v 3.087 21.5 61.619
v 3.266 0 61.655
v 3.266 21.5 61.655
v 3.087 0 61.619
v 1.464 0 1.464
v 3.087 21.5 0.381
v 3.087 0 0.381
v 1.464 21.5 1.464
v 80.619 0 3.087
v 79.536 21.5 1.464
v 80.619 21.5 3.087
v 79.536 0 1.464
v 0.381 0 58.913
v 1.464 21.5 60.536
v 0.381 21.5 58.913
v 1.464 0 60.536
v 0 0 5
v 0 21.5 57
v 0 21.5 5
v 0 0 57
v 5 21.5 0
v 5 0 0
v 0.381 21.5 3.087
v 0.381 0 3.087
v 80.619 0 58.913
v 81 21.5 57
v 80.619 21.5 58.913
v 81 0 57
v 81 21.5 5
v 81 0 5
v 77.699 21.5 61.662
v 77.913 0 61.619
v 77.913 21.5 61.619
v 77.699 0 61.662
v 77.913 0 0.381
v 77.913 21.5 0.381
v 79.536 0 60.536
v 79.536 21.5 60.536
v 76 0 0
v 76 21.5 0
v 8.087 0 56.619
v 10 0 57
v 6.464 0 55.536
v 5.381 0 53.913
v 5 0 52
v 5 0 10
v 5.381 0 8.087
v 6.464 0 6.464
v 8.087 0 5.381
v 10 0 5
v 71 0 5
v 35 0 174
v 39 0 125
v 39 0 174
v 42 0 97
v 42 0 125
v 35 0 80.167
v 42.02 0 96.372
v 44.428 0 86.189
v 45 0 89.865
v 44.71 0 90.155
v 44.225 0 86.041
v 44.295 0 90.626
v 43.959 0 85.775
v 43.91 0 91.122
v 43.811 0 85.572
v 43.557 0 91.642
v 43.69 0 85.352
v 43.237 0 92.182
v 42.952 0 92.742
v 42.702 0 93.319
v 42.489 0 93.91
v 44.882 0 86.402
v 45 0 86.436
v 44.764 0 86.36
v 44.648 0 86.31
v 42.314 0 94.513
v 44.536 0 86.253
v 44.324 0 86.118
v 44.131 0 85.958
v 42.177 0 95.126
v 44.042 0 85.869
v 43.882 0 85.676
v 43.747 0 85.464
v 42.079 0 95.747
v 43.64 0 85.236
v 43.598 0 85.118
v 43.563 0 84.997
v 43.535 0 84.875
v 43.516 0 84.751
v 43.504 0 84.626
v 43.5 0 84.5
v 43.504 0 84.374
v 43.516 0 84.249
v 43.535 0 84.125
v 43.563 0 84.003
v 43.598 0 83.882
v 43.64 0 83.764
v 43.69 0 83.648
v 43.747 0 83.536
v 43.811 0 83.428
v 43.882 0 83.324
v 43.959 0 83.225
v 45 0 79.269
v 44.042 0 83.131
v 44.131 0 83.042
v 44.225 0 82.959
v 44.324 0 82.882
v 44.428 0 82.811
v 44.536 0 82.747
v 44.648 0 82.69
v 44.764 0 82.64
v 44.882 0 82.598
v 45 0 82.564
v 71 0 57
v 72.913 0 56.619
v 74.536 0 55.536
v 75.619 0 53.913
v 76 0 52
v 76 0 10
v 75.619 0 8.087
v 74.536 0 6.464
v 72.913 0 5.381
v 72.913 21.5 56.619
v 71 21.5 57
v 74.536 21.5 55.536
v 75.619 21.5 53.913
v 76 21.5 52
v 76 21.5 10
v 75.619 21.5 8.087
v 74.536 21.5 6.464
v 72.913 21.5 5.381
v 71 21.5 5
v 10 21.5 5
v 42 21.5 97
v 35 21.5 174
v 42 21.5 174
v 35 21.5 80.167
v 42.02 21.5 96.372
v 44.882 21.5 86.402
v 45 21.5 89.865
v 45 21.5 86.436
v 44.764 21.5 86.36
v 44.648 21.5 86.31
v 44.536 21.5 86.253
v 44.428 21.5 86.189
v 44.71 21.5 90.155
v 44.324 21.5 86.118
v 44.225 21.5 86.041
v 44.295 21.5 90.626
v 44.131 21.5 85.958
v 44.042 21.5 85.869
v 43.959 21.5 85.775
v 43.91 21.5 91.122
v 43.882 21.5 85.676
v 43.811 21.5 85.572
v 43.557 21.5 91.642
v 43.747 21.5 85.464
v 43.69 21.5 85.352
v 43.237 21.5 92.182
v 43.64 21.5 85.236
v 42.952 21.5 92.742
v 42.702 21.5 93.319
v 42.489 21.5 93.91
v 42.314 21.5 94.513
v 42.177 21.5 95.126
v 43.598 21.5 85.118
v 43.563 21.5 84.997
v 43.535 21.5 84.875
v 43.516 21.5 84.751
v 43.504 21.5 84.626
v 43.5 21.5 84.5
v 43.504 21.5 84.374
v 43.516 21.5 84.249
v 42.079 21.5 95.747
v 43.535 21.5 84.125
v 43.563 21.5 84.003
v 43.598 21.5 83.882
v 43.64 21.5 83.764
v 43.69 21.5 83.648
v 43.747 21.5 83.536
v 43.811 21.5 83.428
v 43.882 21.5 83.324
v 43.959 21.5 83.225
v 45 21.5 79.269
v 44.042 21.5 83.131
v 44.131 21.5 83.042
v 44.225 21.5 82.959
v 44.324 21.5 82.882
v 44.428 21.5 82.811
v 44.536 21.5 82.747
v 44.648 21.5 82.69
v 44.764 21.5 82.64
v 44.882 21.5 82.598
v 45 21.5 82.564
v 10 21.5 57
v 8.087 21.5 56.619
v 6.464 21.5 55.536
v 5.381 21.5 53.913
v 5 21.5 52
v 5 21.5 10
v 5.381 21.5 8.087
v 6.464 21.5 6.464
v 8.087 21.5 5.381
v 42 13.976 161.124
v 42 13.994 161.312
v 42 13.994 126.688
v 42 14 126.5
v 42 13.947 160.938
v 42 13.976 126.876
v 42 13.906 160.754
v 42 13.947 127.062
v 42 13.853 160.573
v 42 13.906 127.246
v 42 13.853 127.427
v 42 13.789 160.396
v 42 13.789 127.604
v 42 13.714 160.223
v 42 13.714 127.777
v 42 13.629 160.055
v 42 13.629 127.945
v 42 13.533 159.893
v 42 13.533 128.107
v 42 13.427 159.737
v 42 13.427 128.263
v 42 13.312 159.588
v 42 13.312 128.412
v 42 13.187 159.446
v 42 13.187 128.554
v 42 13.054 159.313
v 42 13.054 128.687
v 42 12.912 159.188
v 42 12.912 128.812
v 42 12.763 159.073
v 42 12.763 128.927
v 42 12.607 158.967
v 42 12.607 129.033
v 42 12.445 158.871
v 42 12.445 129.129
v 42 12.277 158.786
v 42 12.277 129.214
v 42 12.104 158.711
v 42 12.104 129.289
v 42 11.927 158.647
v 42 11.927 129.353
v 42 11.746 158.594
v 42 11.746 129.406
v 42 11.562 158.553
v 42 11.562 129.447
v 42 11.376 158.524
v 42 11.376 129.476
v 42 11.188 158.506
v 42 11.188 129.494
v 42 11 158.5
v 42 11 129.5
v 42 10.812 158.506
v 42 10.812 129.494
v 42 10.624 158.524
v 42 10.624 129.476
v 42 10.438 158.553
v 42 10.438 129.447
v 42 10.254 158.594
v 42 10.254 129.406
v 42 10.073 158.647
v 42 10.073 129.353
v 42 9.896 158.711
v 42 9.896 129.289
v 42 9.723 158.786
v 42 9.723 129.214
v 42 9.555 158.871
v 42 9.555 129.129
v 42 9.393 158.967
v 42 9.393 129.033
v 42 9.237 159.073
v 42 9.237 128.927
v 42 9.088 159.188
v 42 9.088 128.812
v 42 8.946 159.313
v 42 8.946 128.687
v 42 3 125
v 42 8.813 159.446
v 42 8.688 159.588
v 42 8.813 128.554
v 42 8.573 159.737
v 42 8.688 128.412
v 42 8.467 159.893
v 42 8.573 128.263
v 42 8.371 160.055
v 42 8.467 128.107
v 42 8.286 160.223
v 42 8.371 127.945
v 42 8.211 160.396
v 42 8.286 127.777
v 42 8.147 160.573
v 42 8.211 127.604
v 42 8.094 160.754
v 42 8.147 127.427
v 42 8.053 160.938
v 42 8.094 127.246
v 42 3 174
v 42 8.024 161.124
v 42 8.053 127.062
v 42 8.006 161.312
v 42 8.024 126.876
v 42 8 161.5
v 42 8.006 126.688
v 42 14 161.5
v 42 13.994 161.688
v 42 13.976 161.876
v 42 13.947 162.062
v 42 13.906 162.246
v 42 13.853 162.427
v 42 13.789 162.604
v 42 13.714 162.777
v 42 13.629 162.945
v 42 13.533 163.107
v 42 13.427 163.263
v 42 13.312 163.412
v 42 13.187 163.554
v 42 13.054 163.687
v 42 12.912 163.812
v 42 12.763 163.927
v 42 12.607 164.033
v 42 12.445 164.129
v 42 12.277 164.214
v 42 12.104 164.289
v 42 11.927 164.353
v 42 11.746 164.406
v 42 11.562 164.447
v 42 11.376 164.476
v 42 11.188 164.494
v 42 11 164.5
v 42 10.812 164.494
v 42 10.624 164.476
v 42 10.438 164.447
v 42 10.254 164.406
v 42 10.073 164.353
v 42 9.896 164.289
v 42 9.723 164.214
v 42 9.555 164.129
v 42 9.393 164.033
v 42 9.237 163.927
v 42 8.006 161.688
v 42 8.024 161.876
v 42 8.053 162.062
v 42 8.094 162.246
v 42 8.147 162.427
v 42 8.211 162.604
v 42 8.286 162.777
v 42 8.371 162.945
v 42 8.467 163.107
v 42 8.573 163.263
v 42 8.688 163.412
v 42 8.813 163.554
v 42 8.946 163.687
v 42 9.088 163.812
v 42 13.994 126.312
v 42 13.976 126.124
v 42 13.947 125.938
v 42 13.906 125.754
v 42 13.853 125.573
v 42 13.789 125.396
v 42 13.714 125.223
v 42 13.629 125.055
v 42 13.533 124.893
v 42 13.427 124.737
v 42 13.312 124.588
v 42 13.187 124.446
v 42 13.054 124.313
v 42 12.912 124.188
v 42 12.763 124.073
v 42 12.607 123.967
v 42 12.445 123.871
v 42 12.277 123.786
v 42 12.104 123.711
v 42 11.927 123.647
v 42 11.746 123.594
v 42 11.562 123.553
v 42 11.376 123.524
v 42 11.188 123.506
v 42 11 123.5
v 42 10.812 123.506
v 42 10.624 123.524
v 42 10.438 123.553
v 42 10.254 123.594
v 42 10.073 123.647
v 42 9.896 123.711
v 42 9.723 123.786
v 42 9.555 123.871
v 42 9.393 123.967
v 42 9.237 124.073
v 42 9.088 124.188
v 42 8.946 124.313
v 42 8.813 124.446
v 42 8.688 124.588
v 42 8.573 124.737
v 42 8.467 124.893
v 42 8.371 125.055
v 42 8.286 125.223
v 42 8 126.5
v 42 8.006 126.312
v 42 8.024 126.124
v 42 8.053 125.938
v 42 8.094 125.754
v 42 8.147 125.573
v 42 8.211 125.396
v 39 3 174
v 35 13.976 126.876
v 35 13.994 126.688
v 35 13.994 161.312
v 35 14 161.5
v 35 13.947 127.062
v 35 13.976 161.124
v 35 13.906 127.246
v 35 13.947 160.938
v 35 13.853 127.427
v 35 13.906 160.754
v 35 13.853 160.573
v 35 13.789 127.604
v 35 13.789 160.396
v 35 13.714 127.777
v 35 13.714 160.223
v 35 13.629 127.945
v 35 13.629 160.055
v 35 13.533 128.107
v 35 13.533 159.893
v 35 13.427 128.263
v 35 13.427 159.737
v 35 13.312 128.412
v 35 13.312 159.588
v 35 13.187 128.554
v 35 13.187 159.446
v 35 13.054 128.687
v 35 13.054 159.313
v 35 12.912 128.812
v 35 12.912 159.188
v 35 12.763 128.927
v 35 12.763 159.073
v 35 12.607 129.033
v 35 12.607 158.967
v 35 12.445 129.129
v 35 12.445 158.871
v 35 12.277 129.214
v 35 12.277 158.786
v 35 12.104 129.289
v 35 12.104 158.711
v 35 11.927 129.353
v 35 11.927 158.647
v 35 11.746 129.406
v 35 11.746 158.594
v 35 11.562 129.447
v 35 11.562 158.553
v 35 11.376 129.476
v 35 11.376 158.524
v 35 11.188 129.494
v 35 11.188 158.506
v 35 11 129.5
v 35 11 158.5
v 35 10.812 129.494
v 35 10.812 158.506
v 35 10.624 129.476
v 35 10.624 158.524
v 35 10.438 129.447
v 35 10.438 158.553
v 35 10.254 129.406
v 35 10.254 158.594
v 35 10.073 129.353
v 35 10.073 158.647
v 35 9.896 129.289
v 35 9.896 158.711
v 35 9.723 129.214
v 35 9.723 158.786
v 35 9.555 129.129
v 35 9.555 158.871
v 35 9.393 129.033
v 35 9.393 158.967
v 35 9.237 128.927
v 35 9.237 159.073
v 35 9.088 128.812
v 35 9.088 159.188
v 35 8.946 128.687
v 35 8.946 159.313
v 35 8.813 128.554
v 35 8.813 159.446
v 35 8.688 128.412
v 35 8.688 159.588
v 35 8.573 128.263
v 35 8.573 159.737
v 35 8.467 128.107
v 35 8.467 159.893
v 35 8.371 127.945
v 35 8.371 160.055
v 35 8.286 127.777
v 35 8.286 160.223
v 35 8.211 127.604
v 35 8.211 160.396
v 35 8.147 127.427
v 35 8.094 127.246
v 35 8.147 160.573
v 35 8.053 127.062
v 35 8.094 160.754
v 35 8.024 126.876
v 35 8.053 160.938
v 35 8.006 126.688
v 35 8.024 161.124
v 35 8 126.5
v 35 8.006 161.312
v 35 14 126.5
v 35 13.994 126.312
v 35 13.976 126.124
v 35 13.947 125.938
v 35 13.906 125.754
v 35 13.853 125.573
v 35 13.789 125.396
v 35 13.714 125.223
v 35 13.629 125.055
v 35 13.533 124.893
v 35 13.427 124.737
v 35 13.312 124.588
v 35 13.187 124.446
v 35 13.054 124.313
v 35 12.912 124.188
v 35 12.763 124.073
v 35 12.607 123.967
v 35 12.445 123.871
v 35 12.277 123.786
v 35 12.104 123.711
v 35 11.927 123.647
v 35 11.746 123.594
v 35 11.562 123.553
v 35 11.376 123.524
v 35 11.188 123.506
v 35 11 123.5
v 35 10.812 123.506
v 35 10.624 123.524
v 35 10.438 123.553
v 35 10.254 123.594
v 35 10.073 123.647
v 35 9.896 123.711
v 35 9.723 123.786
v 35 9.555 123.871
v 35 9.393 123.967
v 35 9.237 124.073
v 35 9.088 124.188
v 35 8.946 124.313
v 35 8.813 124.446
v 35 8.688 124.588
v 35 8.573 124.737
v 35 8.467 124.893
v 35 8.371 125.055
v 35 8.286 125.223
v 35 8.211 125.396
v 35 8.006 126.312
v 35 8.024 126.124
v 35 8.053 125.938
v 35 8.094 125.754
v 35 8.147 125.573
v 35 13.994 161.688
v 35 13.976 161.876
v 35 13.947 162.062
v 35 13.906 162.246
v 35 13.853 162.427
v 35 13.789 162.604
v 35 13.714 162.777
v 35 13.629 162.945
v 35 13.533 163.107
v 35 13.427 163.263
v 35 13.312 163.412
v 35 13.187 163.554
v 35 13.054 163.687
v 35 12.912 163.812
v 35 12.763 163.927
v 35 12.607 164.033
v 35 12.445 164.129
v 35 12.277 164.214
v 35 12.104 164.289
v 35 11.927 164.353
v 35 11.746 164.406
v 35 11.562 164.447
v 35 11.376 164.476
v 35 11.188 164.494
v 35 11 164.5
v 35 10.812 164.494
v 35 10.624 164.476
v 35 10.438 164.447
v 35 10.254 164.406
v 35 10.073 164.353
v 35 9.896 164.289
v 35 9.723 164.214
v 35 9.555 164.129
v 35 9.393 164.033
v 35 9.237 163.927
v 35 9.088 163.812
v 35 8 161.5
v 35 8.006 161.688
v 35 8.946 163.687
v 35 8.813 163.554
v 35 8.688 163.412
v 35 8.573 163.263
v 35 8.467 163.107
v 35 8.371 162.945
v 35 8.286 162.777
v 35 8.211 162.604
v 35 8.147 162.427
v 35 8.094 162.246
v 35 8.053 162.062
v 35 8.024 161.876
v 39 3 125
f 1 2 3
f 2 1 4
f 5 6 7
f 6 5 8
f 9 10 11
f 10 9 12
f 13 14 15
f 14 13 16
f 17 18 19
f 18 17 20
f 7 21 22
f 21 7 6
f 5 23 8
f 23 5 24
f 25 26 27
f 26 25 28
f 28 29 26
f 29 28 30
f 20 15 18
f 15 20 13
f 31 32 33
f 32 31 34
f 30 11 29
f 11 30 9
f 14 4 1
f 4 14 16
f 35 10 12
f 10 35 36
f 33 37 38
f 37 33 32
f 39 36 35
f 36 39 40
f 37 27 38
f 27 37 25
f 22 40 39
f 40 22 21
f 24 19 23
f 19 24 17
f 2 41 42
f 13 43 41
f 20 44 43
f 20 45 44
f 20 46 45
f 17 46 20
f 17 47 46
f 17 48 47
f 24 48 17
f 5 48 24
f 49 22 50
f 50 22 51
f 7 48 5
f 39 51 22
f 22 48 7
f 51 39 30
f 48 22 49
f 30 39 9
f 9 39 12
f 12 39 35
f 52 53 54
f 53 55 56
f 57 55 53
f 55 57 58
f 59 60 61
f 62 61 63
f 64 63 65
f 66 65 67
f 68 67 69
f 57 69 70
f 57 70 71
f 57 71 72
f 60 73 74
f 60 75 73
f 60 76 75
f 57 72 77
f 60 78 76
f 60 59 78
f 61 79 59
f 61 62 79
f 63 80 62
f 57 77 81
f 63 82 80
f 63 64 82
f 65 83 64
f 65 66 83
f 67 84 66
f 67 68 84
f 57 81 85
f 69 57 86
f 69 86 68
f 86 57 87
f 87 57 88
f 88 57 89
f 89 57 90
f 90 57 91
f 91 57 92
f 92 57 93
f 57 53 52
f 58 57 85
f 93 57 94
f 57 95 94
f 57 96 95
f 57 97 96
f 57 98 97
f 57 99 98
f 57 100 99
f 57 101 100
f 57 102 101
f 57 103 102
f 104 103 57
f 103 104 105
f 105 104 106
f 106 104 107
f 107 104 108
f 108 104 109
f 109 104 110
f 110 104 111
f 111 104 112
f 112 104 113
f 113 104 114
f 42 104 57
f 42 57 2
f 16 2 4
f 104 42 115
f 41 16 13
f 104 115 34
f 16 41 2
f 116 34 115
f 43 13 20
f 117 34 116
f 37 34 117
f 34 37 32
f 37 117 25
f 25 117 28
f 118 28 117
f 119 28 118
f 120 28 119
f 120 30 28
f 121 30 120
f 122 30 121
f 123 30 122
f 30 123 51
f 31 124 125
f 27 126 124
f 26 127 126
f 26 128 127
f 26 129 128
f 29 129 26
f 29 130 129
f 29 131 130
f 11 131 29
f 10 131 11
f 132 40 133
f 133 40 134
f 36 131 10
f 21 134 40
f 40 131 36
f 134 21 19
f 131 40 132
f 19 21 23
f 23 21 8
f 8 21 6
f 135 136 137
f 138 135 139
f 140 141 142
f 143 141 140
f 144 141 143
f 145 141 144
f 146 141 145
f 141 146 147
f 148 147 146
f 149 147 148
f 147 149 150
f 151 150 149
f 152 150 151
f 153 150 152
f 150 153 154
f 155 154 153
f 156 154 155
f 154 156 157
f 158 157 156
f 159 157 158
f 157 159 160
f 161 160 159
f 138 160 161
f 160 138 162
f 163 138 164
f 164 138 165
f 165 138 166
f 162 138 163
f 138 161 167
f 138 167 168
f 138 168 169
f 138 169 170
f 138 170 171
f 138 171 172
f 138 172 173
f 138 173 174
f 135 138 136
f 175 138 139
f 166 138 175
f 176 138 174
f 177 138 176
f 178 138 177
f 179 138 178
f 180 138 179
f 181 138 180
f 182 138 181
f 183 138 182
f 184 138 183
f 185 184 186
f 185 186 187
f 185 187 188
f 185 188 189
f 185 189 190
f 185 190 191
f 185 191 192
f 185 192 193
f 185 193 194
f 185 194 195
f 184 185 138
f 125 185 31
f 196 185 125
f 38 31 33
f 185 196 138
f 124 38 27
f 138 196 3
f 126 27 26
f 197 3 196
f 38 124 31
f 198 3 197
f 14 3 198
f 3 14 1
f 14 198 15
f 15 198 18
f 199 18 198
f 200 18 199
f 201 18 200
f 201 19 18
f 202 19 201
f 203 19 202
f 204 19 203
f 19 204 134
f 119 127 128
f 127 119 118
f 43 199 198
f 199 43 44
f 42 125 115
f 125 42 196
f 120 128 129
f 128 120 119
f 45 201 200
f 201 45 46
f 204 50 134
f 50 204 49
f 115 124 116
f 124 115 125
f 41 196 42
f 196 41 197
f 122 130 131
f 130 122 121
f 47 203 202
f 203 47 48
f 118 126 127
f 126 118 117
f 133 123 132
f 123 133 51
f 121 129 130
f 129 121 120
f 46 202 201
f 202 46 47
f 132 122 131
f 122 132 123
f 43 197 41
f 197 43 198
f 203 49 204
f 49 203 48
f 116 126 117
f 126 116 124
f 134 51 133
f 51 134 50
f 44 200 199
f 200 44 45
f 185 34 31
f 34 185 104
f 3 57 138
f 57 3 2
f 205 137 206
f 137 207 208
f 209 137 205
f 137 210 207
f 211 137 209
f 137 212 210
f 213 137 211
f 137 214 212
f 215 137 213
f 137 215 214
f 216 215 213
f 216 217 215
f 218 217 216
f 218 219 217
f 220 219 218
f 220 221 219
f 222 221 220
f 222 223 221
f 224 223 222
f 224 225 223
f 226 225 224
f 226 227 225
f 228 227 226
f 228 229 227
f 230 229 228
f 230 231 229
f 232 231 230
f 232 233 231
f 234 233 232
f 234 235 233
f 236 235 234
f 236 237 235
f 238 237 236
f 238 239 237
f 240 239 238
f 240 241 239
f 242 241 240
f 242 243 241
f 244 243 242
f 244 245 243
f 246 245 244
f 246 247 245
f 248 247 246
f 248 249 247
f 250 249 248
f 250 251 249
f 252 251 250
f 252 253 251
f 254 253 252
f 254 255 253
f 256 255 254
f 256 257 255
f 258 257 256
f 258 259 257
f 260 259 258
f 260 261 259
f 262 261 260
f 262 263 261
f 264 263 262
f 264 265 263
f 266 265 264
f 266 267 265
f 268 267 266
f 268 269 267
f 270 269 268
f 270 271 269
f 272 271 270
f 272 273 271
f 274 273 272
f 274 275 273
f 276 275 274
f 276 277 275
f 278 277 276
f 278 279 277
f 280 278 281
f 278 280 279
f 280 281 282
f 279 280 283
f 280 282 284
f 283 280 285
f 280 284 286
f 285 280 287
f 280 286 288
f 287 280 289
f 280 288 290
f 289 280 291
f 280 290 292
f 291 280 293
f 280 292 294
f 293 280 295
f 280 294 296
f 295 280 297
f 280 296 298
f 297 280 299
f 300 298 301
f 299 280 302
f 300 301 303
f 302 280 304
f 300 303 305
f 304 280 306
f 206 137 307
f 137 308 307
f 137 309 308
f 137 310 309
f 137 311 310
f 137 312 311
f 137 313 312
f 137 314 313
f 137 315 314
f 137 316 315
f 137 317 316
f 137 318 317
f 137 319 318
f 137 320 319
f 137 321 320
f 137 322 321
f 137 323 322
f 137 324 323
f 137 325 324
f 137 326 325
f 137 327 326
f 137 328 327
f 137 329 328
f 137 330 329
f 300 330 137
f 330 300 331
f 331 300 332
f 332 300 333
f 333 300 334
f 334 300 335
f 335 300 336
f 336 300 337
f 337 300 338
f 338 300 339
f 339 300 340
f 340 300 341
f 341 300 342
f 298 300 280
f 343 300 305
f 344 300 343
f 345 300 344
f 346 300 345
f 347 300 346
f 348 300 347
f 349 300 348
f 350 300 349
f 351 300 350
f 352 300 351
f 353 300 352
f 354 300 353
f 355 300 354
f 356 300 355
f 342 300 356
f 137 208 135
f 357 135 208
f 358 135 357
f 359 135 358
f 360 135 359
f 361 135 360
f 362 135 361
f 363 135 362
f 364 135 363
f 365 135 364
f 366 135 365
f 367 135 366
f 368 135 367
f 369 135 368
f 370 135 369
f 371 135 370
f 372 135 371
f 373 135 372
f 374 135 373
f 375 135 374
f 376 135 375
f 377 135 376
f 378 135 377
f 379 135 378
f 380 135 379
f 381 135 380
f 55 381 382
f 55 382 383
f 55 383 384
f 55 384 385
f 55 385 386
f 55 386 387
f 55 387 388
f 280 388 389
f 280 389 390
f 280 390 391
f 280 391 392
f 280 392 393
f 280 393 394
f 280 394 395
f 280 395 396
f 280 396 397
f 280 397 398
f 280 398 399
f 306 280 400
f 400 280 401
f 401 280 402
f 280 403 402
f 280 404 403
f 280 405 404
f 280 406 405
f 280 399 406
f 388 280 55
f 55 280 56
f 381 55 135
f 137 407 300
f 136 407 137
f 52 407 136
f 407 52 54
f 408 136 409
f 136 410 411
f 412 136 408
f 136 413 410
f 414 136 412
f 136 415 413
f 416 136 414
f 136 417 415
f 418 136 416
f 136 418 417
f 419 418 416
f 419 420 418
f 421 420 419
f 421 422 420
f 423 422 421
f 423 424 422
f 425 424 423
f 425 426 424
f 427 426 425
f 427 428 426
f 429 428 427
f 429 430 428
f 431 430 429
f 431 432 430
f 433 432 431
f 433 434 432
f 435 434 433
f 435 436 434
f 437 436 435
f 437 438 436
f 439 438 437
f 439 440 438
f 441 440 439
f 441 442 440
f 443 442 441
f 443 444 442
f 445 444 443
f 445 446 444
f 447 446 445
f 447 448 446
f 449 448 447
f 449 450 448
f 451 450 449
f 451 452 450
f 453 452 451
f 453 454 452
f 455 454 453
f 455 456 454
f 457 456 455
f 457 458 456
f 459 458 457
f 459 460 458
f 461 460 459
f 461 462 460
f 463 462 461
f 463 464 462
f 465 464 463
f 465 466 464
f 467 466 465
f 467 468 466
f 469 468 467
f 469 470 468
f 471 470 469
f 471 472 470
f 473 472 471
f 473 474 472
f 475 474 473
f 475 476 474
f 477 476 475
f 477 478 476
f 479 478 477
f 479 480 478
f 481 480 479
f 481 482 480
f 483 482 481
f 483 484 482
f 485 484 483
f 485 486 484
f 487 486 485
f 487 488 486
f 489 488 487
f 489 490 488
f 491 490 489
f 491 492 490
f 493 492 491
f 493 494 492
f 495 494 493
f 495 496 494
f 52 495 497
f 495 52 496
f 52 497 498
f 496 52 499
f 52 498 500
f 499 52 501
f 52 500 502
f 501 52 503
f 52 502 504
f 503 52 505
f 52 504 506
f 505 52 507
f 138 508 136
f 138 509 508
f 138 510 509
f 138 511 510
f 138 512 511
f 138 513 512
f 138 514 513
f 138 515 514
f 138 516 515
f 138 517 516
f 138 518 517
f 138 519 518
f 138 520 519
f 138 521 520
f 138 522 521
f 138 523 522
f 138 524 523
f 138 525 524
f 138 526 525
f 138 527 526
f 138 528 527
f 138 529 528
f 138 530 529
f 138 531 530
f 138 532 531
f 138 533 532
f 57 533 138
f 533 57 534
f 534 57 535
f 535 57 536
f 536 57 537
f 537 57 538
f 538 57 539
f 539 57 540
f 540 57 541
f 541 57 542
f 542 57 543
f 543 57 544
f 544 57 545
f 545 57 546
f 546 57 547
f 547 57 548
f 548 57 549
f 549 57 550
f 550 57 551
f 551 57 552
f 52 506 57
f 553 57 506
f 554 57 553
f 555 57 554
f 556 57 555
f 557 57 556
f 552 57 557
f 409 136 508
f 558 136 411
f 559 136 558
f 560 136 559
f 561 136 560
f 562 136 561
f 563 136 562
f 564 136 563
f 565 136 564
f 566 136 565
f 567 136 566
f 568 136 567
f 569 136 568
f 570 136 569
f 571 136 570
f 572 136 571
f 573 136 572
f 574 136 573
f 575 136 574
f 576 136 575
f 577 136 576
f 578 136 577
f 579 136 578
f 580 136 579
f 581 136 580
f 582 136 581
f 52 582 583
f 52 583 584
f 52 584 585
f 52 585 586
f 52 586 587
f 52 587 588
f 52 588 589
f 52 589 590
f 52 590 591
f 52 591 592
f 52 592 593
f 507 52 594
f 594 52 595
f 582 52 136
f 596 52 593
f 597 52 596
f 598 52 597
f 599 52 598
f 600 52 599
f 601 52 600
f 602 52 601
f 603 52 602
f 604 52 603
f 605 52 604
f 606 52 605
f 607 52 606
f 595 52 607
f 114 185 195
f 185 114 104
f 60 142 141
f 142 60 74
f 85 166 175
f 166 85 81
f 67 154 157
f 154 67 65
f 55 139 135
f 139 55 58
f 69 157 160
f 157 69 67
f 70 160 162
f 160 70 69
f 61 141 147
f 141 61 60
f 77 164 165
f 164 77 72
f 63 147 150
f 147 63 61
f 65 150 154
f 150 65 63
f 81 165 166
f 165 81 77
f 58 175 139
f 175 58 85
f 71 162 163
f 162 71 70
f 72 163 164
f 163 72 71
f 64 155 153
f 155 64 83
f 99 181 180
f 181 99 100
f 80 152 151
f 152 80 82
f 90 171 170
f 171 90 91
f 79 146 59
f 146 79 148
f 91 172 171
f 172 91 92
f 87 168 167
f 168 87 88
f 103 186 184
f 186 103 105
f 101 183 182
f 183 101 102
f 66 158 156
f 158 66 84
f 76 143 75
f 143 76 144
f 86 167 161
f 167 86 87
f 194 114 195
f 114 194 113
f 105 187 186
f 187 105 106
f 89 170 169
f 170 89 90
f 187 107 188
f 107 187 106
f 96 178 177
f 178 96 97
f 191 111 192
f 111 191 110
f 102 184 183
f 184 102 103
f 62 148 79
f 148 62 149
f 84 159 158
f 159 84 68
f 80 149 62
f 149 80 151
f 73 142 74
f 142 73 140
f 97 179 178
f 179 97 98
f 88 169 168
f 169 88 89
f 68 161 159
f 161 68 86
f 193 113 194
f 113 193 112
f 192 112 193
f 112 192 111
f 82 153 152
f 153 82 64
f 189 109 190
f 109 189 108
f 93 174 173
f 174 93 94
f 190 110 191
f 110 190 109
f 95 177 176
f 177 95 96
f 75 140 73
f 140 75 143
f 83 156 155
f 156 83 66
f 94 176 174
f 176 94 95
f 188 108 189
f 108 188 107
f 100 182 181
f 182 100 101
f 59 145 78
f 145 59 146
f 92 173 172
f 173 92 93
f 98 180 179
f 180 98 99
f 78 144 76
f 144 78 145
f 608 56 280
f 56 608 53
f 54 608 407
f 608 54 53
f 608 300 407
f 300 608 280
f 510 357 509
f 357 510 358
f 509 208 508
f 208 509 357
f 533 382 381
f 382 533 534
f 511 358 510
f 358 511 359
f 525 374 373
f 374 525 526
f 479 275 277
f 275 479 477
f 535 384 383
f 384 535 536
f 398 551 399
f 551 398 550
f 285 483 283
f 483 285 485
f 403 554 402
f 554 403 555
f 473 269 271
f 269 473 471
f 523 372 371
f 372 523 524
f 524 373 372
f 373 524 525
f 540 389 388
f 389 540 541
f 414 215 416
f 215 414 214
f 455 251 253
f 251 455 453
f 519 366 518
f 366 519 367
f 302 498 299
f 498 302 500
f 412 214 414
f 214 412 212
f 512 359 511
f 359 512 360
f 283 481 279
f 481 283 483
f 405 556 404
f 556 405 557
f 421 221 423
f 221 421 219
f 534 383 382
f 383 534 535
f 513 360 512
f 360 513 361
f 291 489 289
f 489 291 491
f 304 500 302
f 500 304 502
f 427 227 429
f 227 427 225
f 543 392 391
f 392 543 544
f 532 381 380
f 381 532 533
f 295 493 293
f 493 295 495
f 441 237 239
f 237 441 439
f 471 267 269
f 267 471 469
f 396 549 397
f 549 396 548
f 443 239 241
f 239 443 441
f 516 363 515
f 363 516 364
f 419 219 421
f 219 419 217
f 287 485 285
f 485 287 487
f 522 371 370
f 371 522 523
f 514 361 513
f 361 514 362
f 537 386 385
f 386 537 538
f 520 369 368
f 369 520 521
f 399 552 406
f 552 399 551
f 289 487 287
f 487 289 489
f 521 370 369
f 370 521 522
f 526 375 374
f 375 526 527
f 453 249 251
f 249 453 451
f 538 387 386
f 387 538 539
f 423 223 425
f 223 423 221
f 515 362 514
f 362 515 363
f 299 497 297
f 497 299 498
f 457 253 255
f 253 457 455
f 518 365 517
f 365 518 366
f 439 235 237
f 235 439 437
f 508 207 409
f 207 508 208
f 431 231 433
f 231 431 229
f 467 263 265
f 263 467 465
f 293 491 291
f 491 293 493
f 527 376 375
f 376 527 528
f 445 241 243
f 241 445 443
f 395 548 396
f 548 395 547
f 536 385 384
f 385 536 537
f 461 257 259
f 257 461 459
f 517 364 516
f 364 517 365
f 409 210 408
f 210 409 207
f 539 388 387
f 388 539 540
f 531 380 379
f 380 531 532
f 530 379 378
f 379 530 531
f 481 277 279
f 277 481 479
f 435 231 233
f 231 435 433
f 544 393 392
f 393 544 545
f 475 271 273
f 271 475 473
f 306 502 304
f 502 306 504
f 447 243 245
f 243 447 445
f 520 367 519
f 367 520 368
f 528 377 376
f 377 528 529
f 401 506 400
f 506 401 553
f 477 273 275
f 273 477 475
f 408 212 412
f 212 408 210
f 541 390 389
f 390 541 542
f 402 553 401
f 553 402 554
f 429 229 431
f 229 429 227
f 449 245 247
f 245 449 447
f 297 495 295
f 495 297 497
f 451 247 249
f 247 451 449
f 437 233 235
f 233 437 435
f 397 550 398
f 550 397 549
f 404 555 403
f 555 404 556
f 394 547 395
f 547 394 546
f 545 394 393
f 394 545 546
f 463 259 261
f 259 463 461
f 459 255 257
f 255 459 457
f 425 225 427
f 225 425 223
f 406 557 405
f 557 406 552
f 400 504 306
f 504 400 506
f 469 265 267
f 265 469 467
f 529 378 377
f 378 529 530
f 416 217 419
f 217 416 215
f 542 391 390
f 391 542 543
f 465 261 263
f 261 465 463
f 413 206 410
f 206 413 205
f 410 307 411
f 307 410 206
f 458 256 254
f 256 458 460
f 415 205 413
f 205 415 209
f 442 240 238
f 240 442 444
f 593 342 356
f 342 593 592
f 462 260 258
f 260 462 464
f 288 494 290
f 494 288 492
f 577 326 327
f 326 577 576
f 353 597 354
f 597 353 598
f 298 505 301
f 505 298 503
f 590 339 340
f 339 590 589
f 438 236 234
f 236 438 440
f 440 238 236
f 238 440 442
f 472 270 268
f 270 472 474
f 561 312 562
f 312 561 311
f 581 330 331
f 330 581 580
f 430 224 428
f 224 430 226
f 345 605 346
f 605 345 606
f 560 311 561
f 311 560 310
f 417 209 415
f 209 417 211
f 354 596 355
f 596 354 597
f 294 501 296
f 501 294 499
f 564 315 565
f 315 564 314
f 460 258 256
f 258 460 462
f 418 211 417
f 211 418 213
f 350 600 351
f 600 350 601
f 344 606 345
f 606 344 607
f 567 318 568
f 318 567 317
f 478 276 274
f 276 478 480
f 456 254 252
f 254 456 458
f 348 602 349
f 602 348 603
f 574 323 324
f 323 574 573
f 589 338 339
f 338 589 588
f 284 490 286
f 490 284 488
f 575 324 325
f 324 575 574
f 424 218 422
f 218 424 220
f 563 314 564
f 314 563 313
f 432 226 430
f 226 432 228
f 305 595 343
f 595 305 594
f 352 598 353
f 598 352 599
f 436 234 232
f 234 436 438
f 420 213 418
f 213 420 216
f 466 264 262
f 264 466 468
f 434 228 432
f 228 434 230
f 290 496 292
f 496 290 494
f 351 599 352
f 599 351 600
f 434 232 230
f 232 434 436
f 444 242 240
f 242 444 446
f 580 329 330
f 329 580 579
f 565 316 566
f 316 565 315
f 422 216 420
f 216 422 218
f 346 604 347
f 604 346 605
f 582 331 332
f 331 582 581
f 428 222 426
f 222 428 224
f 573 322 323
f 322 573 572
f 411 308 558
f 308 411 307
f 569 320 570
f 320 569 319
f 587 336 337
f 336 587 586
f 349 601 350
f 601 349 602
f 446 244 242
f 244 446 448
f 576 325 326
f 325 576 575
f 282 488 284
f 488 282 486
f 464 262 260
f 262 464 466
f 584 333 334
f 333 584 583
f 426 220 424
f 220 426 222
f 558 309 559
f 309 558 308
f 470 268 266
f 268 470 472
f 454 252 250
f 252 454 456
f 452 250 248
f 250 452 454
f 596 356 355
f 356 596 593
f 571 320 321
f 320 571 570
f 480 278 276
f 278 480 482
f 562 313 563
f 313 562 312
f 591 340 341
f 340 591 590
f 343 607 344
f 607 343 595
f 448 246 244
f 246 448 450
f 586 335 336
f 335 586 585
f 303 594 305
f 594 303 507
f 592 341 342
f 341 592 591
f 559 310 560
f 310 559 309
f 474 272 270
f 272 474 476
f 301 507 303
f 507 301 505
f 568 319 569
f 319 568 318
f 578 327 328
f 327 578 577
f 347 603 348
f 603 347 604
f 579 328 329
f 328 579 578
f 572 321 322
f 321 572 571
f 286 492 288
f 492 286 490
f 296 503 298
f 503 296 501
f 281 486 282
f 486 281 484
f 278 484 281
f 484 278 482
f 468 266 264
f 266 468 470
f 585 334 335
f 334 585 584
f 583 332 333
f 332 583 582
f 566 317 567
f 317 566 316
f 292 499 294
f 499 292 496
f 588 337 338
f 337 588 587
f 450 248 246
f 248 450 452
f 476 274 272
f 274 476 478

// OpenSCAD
module support() {
    
    module border() {
        difference() {
            translate([5, 0, 5]) {
                minkowski() {
                    cube([71, 10, 52]);
                    rotate([-90, 0, 0]) {
                        cylinder(r=5, h=11.5);
                    }
                }
            }       
        
            translate([10, -1, 10]) {
                minkowski() {
                    cube([71-10, 10, 52-10]);
                    rotate([-90, 0, 0]) {
                        cylinder(r=5, h=22);
                    }
                }
            }
        }
    }
    
    module holder() {
        difference() {
            union() {
                translate([3, 21.5, 61.5]) {
                    rotate([90, 0, 0]) {
                        linear_extrude(height = 21.5) {
                            polygon([[0, 0], [36, 21], [75, 0]]);
                        }
                    }
                }
                translate([35, 0, 79]) {
                    cube([7, 21.5, 95]);
                }
                translate([35, 0, 79]) {
                    cube([10, 21.5, 18]);
                }        
            }
            translate([52, -1, 97]) {
                rotate([-90, 0, 0]) {
                    cylinder(r=10, h=25, $fn=100);
                }
            }
            translate([45.5, -1, 84.5]) {
                rotate([-90, 0, 0]) {
                    cylinder(r=2, h=25, $fn=100);
                }
            }
            translate([39, -2, 84.5 + 40.5]) {
                cube([5, 5, 52]);
            }         
            * translate([40, -3, 84.5]) {
                cube([5, 5, 41.5]);
            }
            translate([44, 11, 84.5 + 42]) {
                rotate([-90, 0, 90]) {
                    cylinder(r=3, h=10, $fn=100);
                }
            }
            translate([44, 11, 84.5 + 77]) {
                rotate([-90, 0, 90]) {
                    cylinder(r=3, h=10, $fn=100);
                }
            }                        
        }
    }
    
    border();
    holder();    
}

support();
